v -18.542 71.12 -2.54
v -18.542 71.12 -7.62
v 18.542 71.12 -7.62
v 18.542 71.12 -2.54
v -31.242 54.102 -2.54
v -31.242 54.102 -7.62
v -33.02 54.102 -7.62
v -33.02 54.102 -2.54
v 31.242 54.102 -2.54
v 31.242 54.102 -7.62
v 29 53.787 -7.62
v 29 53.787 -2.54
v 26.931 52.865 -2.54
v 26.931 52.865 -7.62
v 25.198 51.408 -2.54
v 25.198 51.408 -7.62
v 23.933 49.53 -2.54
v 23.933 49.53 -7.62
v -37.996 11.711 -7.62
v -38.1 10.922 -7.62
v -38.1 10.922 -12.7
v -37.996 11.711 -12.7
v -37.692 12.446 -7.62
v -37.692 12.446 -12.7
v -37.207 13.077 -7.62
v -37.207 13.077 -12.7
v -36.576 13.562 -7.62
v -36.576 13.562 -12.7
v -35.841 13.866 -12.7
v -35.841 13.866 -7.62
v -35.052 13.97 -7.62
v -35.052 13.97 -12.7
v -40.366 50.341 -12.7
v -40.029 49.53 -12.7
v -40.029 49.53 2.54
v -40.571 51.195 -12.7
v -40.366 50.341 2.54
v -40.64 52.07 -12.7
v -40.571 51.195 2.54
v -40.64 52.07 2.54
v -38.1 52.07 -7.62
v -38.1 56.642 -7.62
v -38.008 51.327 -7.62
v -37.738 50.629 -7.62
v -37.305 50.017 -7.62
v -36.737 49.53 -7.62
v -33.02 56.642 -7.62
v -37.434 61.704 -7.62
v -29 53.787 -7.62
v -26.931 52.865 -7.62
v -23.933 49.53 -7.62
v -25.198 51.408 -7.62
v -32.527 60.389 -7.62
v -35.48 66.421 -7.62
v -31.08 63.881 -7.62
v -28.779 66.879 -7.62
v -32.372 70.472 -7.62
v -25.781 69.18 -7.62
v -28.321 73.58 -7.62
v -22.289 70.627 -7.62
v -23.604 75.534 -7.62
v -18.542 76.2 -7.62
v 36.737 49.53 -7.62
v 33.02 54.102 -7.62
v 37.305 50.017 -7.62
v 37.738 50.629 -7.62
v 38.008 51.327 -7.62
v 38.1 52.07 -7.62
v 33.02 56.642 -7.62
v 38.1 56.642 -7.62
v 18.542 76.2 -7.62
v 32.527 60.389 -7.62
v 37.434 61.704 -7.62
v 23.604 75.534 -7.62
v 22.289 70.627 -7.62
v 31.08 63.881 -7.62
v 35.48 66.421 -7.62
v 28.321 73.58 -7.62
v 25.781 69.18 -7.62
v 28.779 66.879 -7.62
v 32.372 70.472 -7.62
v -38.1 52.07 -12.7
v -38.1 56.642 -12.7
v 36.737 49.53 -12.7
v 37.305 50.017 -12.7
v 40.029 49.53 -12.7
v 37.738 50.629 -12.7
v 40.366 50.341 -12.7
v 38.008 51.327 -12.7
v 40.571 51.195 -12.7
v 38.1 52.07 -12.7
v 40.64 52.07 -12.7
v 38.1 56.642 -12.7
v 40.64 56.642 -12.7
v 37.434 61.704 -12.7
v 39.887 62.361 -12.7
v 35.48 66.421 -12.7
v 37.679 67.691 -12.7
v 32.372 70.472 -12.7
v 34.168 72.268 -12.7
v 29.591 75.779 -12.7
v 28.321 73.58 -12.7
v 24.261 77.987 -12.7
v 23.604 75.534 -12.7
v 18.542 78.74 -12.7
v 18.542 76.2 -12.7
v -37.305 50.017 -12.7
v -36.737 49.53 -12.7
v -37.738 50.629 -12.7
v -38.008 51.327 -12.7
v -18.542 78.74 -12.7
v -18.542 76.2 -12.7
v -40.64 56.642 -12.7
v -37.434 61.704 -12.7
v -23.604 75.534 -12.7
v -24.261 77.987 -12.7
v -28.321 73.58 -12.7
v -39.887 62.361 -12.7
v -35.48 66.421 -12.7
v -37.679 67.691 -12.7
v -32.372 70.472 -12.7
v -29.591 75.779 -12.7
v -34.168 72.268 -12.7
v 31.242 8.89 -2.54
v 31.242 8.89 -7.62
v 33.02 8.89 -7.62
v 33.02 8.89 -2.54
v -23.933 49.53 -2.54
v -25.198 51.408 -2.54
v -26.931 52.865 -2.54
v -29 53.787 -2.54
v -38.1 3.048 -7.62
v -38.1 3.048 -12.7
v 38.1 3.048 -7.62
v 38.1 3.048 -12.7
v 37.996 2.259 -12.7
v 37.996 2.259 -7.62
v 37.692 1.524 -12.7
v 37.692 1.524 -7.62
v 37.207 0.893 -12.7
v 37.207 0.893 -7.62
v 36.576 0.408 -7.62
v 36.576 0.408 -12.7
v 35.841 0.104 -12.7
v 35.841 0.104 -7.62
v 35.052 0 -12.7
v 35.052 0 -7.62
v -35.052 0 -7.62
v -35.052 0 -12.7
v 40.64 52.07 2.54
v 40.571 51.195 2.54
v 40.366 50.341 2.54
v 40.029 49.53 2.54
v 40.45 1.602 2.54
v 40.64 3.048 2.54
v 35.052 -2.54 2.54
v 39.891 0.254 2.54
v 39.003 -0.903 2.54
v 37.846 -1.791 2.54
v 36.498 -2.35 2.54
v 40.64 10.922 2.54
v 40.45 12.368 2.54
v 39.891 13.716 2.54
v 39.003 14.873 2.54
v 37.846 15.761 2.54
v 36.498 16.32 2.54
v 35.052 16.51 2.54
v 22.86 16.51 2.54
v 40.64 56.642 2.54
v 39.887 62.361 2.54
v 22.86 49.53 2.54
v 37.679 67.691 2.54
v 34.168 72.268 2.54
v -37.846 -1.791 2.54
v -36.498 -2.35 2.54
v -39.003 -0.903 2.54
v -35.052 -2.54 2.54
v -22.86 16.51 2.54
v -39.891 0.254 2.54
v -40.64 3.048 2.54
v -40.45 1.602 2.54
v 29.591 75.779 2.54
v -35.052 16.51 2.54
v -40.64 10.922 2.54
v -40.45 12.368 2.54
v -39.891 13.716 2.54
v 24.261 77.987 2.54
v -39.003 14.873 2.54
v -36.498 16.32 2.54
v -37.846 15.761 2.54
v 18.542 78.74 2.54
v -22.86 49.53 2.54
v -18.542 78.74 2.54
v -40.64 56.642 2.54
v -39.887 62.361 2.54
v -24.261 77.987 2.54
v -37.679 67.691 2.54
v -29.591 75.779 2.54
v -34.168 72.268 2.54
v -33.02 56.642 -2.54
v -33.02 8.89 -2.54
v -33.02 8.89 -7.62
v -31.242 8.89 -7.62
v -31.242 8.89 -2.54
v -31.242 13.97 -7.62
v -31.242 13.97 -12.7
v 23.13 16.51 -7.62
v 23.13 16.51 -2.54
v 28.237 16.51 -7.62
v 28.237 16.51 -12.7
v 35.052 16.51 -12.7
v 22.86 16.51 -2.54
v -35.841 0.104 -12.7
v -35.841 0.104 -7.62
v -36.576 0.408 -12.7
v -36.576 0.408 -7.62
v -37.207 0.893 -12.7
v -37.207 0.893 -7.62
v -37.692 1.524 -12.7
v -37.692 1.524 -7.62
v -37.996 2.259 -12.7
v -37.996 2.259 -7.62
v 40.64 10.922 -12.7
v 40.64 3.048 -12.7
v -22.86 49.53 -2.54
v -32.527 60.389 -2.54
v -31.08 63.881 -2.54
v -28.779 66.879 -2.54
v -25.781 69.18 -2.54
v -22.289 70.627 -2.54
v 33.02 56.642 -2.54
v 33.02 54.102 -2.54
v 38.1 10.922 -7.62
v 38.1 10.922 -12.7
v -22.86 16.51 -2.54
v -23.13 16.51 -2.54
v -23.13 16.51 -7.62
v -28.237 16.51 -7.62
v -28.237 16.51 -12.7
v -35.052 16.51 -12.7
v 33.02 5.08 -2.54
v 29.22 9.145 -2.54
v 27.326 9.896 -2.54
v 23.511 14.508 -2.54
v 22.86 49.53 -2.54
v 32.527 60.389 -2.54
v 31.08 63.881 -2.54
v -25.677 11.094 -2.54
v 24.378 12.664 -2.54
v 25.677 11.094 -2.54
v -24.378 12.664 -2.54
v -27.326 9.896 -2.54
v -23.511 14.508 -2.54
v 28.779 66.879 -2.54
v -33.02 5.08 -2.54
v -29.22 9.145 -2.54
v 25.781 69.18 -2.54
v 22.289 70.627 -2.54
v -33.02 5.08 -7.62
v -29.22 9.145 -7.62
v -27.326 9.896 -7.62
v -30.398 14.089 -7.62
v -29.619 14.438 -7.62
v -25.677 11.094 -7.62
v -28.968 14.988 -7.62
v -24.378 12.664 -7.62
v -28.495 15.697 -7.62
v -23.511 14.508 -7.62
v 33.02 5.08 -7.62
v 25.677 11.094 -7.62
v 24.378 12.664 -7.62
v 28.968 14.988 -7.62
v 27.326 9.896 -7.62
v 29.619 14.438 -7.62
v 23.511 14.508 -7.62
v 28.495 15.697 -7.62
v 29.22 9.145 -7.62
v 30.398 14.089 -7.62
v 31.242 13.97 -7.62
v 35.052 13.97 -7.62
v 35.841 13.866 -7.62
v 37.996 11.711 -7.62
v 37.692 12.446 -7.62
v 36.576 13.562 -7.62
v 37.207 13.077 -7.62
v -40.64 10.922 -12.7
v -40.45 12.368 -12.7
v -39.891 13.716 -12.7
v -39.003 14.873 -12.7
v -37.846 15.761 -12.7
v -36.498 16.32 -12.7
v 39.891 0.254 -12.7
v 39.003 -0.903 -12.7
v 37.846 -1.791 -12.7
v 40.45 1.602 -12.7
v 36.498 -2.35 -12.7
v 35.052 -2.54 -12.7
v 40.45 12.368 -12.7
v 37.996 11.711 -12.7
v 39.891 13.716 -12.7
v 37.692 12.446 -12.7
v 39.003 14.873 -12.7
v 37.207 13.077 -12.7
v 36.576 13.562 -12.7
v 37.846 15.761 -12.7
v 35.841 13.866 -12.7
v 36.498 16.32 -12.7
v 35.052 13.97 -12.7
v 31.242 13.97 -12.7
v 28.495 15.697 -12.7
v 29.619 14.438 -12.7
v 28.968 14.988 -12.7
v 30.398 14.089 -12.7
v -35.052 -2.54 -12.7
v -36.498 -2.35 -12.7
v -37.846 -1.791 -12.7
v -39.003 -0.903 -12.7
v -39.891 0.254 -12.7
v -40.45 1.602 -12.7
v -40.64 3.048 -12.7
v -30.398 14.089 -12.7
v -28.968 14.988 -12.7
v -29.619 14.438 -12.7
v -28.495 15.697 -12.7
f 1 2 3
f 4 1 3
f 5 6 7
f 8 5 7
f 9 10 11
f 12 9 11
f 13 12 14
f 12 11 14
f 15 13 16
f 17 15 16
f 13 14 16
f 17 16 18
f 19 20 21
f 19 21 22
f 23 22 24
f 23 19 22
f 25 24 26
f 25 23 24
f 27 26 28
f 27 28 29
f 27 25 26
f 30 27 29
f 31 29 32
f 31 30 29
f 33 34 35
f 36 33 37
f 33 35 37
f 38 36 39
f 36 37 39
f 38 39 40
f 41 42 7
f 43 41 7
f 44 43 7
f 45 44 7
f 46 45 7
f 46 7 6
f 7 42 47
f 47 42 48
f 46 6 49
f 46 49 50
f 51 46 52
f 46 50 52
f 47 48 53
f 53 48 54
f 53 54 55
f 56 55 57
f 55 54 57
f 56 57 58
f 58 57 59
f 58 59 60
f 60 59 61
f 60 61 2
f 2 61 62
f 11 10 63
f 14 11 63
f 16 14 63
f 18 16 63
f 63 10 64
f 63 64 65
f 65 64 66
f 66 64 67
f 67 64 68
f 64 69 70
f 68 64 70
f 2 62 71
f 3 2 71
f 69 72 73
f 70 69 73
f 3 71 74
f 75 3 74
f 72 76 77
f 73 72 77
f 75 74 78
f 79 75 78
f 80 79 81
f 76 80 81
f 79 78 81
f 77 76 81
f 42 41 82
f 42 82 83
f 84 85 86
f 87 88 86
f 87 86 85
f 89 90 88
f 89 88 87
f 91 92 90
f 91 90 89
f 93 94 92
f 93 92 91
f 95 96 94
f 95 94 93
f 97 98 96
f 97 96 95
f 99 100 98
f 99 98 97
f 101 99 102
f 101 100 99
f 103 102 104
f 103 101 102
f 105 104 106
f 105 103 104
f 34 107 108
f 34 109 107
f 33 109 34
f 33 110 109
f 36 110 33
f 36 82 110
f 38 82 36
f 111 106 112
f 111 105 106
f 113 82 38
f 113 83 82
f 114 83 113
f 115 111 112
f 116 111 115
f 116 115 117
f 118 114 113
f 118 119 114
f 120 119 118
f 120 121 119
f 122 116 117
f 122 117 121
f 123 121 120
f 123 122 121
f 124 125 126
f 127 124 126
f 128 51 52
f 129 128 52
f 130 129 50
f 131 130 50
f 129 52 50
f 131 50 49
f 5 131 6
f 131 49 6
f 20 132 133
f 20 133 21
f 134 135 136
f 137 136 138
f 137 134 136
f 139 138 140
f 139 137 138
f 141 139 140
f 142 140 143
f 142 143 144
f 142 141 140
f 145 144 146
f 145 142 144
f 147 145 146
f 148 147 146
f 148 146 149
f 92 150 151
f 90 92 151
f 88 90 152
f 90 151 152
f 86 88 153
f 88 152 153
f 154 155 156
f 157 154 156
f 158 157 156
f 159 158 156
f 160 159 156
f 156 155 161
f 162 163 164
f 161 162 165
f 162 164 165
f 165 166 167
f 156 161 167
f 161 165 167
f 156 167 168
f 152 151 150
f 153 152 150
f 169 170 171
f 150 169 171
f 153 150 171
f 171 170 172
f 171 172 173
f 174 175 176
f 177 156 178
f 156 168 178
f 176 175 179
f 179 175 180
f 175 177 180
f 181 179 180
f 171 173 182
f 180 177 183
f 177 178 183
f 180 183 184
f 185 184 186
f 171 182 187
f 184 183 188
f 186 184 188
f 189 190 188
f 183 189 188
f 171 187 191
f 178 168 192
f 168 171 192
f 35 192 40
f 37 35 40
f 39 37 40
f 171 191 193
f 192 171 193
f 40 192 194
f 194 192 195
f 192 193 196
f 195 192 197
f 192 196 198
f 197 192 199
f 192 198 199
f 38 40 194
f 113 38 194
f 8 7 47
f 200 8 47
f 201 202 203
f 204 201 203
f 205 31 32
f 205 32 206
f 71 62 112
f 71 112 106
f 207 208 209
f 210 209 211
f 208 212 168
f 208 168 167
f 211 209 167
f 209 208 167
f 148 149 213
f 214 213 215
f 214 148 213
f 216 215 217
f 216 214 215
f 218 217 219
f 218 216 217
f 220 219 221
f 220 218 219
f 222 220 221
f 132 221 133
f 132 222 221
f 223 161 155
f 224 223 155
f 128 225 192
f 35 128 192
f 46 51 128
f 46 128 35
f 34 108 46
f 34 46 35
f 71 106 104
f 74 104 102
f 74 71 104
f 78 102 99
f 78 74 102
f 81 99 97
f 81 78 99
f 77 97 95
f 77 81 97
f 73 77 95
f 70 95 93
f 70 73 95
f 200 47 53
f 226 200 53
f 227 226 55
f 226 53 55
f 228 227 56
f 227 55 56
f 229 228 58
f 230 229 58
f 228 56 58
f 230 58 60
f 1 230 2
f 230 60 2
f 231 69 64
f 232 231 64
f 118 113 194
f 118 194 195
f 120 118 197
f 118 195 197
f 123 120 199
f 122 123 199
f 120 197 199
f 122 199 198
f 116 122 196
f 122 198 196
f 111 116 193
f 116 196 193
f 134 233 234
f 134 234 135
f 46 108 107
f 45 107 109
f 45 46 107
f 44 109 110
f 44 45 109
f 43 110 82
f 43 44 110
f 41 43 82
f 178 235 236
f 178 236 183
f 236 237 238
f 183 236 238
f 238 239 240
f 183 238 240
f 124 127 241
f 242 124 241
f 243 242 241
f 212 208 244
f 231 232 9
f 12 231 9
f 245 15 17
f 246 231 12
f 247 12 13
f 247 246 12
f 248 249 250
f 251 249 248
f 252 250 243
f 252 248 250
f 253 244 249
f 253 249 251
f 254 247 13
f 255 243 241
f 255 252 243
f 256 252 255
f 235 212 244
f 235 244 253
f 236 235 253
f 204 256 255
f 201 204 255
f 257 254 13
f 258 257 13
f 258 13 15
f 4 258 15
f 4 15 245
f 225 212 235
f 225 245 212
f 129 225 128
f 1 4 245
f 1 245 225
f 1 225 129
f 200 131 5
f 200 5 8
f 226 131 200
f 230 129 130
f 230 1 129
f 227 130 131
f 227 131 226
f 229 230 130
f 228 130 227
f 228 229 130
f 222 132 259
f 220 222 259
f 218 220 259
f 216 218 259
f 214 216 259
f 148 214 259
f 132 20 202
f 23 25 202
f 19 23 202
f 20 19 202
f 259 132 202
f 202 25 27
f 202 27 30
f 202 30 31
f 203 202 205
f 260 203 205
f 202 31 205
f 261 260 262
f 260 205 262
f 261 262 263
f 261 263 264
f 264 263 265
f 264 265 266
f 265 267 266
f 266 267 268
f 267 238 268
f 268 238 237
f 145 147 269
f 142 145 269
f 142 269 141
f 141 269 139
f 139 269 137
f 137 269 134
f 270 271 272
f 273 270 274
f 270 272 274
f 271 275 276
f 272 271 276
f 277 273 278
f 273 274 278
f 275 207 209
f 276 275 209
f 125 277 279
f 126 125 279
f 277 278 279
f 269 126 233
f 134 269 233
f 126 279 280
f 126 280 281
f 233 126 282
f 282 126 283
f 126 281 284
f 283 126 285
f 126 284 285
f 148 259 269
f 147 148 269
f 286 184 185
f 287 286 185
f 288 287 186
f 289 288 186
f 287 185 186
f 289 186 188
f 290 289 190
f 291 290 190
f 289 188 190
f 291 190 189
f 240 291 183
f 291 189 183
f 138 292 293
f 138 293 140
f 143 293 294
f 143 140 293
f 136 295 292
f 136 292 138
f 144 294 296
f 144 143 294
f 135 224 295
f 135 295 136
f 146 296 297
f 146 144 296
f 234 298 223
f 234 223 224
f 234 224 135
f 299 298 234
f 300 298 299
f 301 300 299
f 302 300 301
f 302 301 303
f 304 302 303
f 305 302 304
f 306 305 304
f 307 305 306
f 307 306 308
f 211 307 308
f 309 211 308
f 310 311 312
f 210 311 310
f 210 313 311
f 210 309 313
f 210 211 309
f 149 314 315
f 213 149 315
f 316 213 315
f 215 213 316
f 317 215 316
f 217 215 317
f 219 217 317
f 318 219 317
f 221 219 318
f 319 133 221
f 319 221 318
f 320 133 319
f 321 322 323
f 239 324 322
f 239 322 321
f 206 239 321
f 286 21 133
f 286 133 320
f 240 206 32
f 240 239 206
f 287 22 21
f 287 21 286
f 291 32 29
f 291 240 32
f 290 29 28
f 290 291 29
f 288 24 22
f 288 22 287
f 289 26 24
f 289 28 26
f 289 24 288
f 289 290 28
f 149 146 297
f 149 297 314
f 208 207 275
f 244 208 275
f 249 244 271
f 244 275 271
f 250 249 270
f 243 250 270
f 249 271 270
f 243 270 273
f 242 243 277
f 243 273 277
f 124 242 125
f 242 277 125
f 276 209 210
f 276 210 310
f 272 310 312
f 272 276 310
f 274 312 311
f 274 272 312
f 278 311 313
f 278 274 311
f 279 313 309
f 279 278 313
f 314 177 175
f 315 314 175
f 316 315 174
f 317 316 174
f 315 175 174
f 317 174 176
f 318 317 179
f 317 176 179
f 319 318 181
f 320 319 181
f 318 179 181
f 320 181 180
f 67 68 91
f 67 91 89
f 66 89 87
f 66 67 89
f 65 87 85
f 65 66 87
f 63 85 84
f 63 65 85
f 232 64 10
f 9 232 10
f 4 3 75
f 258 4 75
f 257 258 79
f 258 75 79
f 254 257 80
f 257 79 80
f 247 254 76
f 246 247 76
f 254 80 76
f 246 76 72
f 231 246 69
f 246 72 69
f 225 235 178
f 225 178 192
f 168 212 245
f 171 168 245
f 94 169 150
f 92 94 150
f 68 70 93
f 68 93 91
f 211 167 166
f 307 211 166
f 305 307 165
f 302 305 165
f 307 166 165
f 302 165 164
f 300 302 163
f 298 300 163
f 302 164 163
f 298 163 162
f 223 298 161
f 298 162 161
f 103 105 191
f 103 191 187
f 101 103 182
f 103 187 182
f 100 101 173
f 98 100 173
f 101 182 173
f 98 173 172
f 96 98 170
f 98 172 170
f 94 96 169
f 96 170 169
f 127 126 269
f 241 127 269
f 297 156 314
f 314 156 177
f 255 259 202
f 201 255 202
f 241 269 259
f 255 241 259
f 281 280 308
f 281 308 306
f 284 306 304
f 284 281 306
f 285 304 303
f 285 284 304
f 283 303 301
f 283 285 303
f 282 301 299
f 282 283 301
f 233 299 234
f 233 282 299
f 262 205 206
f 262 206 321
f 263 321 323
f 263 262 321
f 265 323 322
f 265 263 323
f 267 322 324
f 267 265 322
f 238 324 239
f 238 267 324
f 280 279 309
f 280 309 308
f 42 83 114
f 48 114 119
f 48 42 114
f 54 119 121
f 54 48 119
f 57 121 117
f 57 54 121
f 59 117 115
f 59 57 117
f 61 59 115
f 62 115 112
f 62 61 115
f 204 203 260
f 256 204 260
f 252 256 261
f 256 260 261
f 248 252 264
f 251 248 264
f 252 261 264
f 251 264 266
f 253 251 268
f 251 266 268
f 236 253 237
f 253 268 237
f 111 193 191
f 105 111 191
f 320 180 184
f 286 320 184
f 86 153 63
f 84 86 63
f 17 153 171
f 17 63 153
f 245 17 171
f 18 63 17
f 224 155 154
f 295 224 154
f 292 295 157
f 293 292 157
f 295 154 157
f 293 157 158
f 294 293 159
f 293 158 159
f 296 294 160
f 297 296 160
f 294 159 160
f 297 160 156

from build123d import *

# Parameters (mm, degrees)
BOSS_EXTRUDE1_DEPTH      = 10.16
CUT_EXTRUDE1_DEPTH       = 5.08
BOSS_EXTRUDE2_DEPTH      = 5.08
BOSS_EXTRUDE2_DEPTH_BACK = 10.16
CUT_EXTRUDE2_REACH       = 91.91
SKETCH8_W                = 23.622
SKETCH8_H                = 33.02


with BuildPart() as part:
    # Sketch1 → Boss-Extrude1 (new body)
    with BuildSketch(Plane.XY.offset(2.54)):
        with BuildLine():
            Line((-35.052, 0), (35.052, 0))
            ThreePointArc((35.052, 0), (37.207261469, 0.892738531), (38.1, 3.048))
            Line((38.1, 3.048), (38.1, 10.922))
            ThreePointArc((38.1, 10.922), (37.207261469, 13.077261469), (35.052, 13.97))
            Line((35.052, 13.97), (31.242, 13.97))
            ThreePointArc((31.242, 13.97), (29.086738531, 14.862738531), (28.194, 17.018))
            Line((28.194, 17.018), (28.194, 45.974))
            ThreePointArc((28.194, 45.974), (29.086738531, 48.129261469), (31.242, 49.022))
            Line((31.242, 49.022), (35.052, 49.022))
            ThreePointArc((35.052, 49.022), (37.207261469, 49.914738531), (38.1, 52.07))
            Line((38.1, 52.07), (38.1, 56.642))
            ThreePointArc((38.1, 56.642), (32.371594426, 70.471594426), (18.542, 76.2))
            Line((18.542, 76.2), (-18.542, 76.2))
            ThreePointArc((-18.542, 76.2), (-32.371594426, 70.471594426), (-38.1, 56.642))
            Line((-38.1, 56.642), (-38.1, 52.07))
            ThreePointArc((-38.1, 52.07), (-37.207261469, 49.914738531), (-35.052, 49.022))
            Line((-35.052, 49.022), (-31.242, 49.022))
            ThreePointArc((-31.242, 49.022), (-29.086738531, 48.129261469), (-28.194, 45.974))
            Line((-28.194, 45.974), (-28.194, 17.018))
            ThreePointArc((-28.194, 17.018), (-29.086738531, 14.862738531), (-31.242, 13.97))
            Line((-31.242, 13.97), (-35.052, 13.97))
            ThreePointArc((-35.052, 13.97), (-37.207261469, 13.077261469), (-38.1, 10.922))
            Line((-38.1, 10.922), (-38.1, 3.048))
            ThreePointArc((-38.1, 3.048), (-37.207261469, 0.892738531), (-35.052, 0))
        make_face()
    extrude(amount=-BOSS_EXTRUDE1_DEPTH)

    # Sketch2 → Cut-Extrude1 (cut)
    with BuildSketch(Plane(origin=(0, 0, -7.62), x_dir=(-1, 0, 0), z_dir=(0, 0, -1))):
        with BuildLine():
            Line((33.02, 54.102), (33.02, 56.642))
            ThreePointArc((33.02, 56.642), (28.779491978, 66.879491978), (18.542, 71.12))
            Line((18.542, 71.12), (-18.542, 71.12))
            ThreePointArc((-18.542, 71.12), (-28.779491978, 66.879491978), (-33.02, 56.642))
            Line((-33.02, 56.642), (-33.02, 54.102))
            Line((-33.02, 54.102), (-31.242, 54.102))
            ThreePointArc((-31.242, 54.102), (-25.494636083, 51.721363917), (-23.114, 45.974))
            Line((-23.114, 45.974), (-23.114, 17.018))
            ThreePointArc((-23.114, 17.018), (-25.494636083, 11.270636083), (-31.242, 8.89))
            Line((-31.242, 8.89), (-33.02, 8.89))
            Line((-33.02, 8.89), (-33.02, 5.08))
            Line((-33.02, 5.08), (33.02, 5.08))
            Line((33.02, 5.08), (33.02, 8.89))
            Line((33.02, 8.89), (31.242, 8.89))
            ThreePointArc((31.242, 8.89), (25.494636083, 11.270636083), (23.114, 17.018))
            Line((23.114, 17.018), (23.114, 45.974))
            ThreePointArc((23.114, 45.974), (25.494636083, 51.721363917), (31.242, 54.102))
            Line((31.242, 54.102), (33.02, 54.102))
        make_face()
    extrude(amount=-CUT_EXTRUDE1_DEPTH, mode=Mode.SUBTRACT)

    # Sketch7 → Boss-Extrude2 (add, two sides: drawn at the far end of the back side and taken through both)
    with BuildSketch(Plane(origin=(0, 0, -7.62), x_dir=(-1, 0, 0), z_dir=(0, 0, -1)).offset(-BOSS_EXTRUDE2_DEPTH_BACK)):
        with BuildLine():
            Line((18.542, 78.74), (-18.542, 78.74))
            ThreePointArc((-18.542, 78.74), (-34.167645651, 72.267645651), (-40.64, 56.642))
            Line((-40.64, 56.642), (-40.64, 52.07))
            ThreePointArc((-40.64, 52.07), (-39.003312693, 48.118687307), (-35.052, 46.482))
            Line((-35.052, 46.482), (-31.242, 46.482))
            ThreePointArc((-31.242, 46.482), (-30.882789755, 46.333210245), (-30.734, 45.974))
            Line((-30.734, 45.974), (-30.734, 17.018))
            ThreePointArc((-30.734, 17.018), (-30.882789755, 16.658789755), (-31.242, 16.51))
            Line((-31.242, 16.51), (-35.052, 16.51))
            ThreePointArc((-35.052, 16.51), (-39.003312693, 14.873312693), (-40.64, 10.922))
            Line((-40.64, 10.922), (-40.64, 3.048))
            ThreePointArc((-40.64, 3.048), (-39.003312693, -0.903312693), (-35.052, -2.54))
            Line((-35.052, -2.54), (35.052, -2.54))
            ThreePointArc((35.052, -2.54), (39.003312693, -0.903312693), (40.64, 3.048))
            Line((40.64, 3.048), (40.64, 10.922))
            ThreePointArc((40.64, 10.922), (39.003312693, 14.873312693), (35.052, 16.51))
            Line((35.052, 16.51), (31.242, 16.51))
            ThreePointArc((31.242, 16.51), (30.882789755, 16.658789755), (30.734, 17.018))
            Line((30.734, 17.018), (30.734, 45.974))
            ThreePointArc((30.734, 45.974), (30.882789755, 46.333210245), (31.242, 46.482))
            Line((31.242, 46.482), (35.052, 46.482))
            ThreePointArc((35.052, 46.482), (39.003312693, 48.118687307), (40.64, 52.07))
            Line((40.64, 52.07), (40.64, 56.642))
            ThreePointArc((40.64, 56.642), (34.167645651, 72.267645651), (18.542, 78.74))
        make_face()
        with BuildLine():
            ThreePointArc((-38.1, 52.07), (-37.207261469, 49.914738531), (-35.052, 49.022))
            Line((-35.052, 49.022), (-31.242, 49.022))
            ThreePointArc((-31.242, 49.022), (-29.086738531, 48.129261469), (-28.194, 45.974))
            Line((-28.194, 45.974), (-28.194, 17.018))
            ThreePointArc((-28.194, 17.018), (-29.086738531, 14.862738531), (-31.242, 13.97))
            Line((-31.242, 13.97), (-35.052, 13.97))
            ThreePointArc((-35.052, 13.97), (-37.207261469, 13.077261469), (-38.1, 10.922))
            Line((-38.1, 10.922), (-38.1, 3.048))
            ThreePointArc((-38.1, 3.048), (-37.207261469, 0.892738531), (-35.052, 0))
            Line((-35.052, 0), (35.052, 0))
            ThreePointArc((35.052, 0), (37.207261469, 0.892738531), (38.1, 3.048))
            Line((38.1, 3.048), (38.1, 10.922))
            ThreePointArc((38.1, 10.922), (37.207261469, 13.077261469), (35.052, 13.97))
            Line((35.052, 13.97), (31.242, 13.97))
            ThreePointArc((31.242, 13.97), (29.086738531, 14.862738531), (28.194, 17.018))
            Line((28.194, 17.018), (28.194, 45.974))
            ThreePointArc((28.194, 45.974), (29.086738531, 48.129261469), (31.242, 49.022))
            Line((31.242, 49.022), (35.052, 49.022))
            ThreePointArc((35.052, 49.022), (37.207261469, 49.914738531), (38.1, 52.07))
            Line((38.1, 52.07), (38.1, 56.642))
            ThreePointArc((38.1, 56.642), (32.371594426, 70.471594426), (18.542, 76.2))
            Line((18.542, 76.2), (-18.542, 76.2))
            ThreePointArc((-18.542, 76.2), (-32.371594426, 70.471594426), (-38.1, 56.642))
            Line((-38.1, 56.642), (-38.1, 52.07))
        make_face(mode=Mode.SUBTRACT)
    extrude(amount=BOSS_EXTRUDE2_DEPTH + BOSS_EXTRUDE2_DEPTH_BACK)

    # Cut-Extrude2: up to this face of the body (flat: up to its plane)
    cut_extrude2_end = Plane(part.part.faces().sort_by_distance((0, 37.604047464, 2.54))[0])
    # Sketch8 → Cut-Extrude2 (cut, up to the picked face)
    with BuildSketch(Plane(origin=(0, 0, -12.7), x_dir=(-1, 0, 0), z_dir=(0, 0, -1)), mode=Mode.PRIVATE) as cut_extrude2_sk1:
        with Locations((-34.671, 33.02)):
            Rectangle(SKETCH8_W, SKETCH8_H)
    cut_extrude2_tool1 = split(extrude(cut_extrude2_sk1.sketch, amount=-CUT_EXTRUDE2_REACH, mode=Mode.PRIVATE), bisect_by=cut_extrude2_end, keep=Keep.BOTH, mode=Mode.PRIVATE)
    # Sketch8 → Cut-Extrude2 (cut, up to the picked face)
    with BuildSketch(Plane(origin=(0, 0, -12.7), x_dir=(-1, 0, 0), z_dir=(0, 0, -1)), mode=Mode.PRIVATE) as cut_extrude2_sk2:
        with Locations((34.671, 33.02)):
            Rectangle(SKETCH8_W, SKETCH8_H)
    cut_extrude2_tool2 = split(extrude(cut_extrude2_sk2.sketch, amount=-CUT_EXTRUDE2_REACH, mode=Mode.PRIVATE), bisect_by=cut_extrude2_end, keep=Keep.BOTH, mode=Mode.PRIVATE)
    add(cut_extrude2_tool1.solids().sort_by(Axis((34.671, 33.02, -12.7), (0, 0, 1)))[0], mode=Mode.SUBTRACT)
    add(cut_extrude2_tool2.solids().sort_by(Axis((-34.671, 33.02, -12.7), (0, 0, 1)))[0], mode=Mode.SUBTRACT)


solid = part.part
